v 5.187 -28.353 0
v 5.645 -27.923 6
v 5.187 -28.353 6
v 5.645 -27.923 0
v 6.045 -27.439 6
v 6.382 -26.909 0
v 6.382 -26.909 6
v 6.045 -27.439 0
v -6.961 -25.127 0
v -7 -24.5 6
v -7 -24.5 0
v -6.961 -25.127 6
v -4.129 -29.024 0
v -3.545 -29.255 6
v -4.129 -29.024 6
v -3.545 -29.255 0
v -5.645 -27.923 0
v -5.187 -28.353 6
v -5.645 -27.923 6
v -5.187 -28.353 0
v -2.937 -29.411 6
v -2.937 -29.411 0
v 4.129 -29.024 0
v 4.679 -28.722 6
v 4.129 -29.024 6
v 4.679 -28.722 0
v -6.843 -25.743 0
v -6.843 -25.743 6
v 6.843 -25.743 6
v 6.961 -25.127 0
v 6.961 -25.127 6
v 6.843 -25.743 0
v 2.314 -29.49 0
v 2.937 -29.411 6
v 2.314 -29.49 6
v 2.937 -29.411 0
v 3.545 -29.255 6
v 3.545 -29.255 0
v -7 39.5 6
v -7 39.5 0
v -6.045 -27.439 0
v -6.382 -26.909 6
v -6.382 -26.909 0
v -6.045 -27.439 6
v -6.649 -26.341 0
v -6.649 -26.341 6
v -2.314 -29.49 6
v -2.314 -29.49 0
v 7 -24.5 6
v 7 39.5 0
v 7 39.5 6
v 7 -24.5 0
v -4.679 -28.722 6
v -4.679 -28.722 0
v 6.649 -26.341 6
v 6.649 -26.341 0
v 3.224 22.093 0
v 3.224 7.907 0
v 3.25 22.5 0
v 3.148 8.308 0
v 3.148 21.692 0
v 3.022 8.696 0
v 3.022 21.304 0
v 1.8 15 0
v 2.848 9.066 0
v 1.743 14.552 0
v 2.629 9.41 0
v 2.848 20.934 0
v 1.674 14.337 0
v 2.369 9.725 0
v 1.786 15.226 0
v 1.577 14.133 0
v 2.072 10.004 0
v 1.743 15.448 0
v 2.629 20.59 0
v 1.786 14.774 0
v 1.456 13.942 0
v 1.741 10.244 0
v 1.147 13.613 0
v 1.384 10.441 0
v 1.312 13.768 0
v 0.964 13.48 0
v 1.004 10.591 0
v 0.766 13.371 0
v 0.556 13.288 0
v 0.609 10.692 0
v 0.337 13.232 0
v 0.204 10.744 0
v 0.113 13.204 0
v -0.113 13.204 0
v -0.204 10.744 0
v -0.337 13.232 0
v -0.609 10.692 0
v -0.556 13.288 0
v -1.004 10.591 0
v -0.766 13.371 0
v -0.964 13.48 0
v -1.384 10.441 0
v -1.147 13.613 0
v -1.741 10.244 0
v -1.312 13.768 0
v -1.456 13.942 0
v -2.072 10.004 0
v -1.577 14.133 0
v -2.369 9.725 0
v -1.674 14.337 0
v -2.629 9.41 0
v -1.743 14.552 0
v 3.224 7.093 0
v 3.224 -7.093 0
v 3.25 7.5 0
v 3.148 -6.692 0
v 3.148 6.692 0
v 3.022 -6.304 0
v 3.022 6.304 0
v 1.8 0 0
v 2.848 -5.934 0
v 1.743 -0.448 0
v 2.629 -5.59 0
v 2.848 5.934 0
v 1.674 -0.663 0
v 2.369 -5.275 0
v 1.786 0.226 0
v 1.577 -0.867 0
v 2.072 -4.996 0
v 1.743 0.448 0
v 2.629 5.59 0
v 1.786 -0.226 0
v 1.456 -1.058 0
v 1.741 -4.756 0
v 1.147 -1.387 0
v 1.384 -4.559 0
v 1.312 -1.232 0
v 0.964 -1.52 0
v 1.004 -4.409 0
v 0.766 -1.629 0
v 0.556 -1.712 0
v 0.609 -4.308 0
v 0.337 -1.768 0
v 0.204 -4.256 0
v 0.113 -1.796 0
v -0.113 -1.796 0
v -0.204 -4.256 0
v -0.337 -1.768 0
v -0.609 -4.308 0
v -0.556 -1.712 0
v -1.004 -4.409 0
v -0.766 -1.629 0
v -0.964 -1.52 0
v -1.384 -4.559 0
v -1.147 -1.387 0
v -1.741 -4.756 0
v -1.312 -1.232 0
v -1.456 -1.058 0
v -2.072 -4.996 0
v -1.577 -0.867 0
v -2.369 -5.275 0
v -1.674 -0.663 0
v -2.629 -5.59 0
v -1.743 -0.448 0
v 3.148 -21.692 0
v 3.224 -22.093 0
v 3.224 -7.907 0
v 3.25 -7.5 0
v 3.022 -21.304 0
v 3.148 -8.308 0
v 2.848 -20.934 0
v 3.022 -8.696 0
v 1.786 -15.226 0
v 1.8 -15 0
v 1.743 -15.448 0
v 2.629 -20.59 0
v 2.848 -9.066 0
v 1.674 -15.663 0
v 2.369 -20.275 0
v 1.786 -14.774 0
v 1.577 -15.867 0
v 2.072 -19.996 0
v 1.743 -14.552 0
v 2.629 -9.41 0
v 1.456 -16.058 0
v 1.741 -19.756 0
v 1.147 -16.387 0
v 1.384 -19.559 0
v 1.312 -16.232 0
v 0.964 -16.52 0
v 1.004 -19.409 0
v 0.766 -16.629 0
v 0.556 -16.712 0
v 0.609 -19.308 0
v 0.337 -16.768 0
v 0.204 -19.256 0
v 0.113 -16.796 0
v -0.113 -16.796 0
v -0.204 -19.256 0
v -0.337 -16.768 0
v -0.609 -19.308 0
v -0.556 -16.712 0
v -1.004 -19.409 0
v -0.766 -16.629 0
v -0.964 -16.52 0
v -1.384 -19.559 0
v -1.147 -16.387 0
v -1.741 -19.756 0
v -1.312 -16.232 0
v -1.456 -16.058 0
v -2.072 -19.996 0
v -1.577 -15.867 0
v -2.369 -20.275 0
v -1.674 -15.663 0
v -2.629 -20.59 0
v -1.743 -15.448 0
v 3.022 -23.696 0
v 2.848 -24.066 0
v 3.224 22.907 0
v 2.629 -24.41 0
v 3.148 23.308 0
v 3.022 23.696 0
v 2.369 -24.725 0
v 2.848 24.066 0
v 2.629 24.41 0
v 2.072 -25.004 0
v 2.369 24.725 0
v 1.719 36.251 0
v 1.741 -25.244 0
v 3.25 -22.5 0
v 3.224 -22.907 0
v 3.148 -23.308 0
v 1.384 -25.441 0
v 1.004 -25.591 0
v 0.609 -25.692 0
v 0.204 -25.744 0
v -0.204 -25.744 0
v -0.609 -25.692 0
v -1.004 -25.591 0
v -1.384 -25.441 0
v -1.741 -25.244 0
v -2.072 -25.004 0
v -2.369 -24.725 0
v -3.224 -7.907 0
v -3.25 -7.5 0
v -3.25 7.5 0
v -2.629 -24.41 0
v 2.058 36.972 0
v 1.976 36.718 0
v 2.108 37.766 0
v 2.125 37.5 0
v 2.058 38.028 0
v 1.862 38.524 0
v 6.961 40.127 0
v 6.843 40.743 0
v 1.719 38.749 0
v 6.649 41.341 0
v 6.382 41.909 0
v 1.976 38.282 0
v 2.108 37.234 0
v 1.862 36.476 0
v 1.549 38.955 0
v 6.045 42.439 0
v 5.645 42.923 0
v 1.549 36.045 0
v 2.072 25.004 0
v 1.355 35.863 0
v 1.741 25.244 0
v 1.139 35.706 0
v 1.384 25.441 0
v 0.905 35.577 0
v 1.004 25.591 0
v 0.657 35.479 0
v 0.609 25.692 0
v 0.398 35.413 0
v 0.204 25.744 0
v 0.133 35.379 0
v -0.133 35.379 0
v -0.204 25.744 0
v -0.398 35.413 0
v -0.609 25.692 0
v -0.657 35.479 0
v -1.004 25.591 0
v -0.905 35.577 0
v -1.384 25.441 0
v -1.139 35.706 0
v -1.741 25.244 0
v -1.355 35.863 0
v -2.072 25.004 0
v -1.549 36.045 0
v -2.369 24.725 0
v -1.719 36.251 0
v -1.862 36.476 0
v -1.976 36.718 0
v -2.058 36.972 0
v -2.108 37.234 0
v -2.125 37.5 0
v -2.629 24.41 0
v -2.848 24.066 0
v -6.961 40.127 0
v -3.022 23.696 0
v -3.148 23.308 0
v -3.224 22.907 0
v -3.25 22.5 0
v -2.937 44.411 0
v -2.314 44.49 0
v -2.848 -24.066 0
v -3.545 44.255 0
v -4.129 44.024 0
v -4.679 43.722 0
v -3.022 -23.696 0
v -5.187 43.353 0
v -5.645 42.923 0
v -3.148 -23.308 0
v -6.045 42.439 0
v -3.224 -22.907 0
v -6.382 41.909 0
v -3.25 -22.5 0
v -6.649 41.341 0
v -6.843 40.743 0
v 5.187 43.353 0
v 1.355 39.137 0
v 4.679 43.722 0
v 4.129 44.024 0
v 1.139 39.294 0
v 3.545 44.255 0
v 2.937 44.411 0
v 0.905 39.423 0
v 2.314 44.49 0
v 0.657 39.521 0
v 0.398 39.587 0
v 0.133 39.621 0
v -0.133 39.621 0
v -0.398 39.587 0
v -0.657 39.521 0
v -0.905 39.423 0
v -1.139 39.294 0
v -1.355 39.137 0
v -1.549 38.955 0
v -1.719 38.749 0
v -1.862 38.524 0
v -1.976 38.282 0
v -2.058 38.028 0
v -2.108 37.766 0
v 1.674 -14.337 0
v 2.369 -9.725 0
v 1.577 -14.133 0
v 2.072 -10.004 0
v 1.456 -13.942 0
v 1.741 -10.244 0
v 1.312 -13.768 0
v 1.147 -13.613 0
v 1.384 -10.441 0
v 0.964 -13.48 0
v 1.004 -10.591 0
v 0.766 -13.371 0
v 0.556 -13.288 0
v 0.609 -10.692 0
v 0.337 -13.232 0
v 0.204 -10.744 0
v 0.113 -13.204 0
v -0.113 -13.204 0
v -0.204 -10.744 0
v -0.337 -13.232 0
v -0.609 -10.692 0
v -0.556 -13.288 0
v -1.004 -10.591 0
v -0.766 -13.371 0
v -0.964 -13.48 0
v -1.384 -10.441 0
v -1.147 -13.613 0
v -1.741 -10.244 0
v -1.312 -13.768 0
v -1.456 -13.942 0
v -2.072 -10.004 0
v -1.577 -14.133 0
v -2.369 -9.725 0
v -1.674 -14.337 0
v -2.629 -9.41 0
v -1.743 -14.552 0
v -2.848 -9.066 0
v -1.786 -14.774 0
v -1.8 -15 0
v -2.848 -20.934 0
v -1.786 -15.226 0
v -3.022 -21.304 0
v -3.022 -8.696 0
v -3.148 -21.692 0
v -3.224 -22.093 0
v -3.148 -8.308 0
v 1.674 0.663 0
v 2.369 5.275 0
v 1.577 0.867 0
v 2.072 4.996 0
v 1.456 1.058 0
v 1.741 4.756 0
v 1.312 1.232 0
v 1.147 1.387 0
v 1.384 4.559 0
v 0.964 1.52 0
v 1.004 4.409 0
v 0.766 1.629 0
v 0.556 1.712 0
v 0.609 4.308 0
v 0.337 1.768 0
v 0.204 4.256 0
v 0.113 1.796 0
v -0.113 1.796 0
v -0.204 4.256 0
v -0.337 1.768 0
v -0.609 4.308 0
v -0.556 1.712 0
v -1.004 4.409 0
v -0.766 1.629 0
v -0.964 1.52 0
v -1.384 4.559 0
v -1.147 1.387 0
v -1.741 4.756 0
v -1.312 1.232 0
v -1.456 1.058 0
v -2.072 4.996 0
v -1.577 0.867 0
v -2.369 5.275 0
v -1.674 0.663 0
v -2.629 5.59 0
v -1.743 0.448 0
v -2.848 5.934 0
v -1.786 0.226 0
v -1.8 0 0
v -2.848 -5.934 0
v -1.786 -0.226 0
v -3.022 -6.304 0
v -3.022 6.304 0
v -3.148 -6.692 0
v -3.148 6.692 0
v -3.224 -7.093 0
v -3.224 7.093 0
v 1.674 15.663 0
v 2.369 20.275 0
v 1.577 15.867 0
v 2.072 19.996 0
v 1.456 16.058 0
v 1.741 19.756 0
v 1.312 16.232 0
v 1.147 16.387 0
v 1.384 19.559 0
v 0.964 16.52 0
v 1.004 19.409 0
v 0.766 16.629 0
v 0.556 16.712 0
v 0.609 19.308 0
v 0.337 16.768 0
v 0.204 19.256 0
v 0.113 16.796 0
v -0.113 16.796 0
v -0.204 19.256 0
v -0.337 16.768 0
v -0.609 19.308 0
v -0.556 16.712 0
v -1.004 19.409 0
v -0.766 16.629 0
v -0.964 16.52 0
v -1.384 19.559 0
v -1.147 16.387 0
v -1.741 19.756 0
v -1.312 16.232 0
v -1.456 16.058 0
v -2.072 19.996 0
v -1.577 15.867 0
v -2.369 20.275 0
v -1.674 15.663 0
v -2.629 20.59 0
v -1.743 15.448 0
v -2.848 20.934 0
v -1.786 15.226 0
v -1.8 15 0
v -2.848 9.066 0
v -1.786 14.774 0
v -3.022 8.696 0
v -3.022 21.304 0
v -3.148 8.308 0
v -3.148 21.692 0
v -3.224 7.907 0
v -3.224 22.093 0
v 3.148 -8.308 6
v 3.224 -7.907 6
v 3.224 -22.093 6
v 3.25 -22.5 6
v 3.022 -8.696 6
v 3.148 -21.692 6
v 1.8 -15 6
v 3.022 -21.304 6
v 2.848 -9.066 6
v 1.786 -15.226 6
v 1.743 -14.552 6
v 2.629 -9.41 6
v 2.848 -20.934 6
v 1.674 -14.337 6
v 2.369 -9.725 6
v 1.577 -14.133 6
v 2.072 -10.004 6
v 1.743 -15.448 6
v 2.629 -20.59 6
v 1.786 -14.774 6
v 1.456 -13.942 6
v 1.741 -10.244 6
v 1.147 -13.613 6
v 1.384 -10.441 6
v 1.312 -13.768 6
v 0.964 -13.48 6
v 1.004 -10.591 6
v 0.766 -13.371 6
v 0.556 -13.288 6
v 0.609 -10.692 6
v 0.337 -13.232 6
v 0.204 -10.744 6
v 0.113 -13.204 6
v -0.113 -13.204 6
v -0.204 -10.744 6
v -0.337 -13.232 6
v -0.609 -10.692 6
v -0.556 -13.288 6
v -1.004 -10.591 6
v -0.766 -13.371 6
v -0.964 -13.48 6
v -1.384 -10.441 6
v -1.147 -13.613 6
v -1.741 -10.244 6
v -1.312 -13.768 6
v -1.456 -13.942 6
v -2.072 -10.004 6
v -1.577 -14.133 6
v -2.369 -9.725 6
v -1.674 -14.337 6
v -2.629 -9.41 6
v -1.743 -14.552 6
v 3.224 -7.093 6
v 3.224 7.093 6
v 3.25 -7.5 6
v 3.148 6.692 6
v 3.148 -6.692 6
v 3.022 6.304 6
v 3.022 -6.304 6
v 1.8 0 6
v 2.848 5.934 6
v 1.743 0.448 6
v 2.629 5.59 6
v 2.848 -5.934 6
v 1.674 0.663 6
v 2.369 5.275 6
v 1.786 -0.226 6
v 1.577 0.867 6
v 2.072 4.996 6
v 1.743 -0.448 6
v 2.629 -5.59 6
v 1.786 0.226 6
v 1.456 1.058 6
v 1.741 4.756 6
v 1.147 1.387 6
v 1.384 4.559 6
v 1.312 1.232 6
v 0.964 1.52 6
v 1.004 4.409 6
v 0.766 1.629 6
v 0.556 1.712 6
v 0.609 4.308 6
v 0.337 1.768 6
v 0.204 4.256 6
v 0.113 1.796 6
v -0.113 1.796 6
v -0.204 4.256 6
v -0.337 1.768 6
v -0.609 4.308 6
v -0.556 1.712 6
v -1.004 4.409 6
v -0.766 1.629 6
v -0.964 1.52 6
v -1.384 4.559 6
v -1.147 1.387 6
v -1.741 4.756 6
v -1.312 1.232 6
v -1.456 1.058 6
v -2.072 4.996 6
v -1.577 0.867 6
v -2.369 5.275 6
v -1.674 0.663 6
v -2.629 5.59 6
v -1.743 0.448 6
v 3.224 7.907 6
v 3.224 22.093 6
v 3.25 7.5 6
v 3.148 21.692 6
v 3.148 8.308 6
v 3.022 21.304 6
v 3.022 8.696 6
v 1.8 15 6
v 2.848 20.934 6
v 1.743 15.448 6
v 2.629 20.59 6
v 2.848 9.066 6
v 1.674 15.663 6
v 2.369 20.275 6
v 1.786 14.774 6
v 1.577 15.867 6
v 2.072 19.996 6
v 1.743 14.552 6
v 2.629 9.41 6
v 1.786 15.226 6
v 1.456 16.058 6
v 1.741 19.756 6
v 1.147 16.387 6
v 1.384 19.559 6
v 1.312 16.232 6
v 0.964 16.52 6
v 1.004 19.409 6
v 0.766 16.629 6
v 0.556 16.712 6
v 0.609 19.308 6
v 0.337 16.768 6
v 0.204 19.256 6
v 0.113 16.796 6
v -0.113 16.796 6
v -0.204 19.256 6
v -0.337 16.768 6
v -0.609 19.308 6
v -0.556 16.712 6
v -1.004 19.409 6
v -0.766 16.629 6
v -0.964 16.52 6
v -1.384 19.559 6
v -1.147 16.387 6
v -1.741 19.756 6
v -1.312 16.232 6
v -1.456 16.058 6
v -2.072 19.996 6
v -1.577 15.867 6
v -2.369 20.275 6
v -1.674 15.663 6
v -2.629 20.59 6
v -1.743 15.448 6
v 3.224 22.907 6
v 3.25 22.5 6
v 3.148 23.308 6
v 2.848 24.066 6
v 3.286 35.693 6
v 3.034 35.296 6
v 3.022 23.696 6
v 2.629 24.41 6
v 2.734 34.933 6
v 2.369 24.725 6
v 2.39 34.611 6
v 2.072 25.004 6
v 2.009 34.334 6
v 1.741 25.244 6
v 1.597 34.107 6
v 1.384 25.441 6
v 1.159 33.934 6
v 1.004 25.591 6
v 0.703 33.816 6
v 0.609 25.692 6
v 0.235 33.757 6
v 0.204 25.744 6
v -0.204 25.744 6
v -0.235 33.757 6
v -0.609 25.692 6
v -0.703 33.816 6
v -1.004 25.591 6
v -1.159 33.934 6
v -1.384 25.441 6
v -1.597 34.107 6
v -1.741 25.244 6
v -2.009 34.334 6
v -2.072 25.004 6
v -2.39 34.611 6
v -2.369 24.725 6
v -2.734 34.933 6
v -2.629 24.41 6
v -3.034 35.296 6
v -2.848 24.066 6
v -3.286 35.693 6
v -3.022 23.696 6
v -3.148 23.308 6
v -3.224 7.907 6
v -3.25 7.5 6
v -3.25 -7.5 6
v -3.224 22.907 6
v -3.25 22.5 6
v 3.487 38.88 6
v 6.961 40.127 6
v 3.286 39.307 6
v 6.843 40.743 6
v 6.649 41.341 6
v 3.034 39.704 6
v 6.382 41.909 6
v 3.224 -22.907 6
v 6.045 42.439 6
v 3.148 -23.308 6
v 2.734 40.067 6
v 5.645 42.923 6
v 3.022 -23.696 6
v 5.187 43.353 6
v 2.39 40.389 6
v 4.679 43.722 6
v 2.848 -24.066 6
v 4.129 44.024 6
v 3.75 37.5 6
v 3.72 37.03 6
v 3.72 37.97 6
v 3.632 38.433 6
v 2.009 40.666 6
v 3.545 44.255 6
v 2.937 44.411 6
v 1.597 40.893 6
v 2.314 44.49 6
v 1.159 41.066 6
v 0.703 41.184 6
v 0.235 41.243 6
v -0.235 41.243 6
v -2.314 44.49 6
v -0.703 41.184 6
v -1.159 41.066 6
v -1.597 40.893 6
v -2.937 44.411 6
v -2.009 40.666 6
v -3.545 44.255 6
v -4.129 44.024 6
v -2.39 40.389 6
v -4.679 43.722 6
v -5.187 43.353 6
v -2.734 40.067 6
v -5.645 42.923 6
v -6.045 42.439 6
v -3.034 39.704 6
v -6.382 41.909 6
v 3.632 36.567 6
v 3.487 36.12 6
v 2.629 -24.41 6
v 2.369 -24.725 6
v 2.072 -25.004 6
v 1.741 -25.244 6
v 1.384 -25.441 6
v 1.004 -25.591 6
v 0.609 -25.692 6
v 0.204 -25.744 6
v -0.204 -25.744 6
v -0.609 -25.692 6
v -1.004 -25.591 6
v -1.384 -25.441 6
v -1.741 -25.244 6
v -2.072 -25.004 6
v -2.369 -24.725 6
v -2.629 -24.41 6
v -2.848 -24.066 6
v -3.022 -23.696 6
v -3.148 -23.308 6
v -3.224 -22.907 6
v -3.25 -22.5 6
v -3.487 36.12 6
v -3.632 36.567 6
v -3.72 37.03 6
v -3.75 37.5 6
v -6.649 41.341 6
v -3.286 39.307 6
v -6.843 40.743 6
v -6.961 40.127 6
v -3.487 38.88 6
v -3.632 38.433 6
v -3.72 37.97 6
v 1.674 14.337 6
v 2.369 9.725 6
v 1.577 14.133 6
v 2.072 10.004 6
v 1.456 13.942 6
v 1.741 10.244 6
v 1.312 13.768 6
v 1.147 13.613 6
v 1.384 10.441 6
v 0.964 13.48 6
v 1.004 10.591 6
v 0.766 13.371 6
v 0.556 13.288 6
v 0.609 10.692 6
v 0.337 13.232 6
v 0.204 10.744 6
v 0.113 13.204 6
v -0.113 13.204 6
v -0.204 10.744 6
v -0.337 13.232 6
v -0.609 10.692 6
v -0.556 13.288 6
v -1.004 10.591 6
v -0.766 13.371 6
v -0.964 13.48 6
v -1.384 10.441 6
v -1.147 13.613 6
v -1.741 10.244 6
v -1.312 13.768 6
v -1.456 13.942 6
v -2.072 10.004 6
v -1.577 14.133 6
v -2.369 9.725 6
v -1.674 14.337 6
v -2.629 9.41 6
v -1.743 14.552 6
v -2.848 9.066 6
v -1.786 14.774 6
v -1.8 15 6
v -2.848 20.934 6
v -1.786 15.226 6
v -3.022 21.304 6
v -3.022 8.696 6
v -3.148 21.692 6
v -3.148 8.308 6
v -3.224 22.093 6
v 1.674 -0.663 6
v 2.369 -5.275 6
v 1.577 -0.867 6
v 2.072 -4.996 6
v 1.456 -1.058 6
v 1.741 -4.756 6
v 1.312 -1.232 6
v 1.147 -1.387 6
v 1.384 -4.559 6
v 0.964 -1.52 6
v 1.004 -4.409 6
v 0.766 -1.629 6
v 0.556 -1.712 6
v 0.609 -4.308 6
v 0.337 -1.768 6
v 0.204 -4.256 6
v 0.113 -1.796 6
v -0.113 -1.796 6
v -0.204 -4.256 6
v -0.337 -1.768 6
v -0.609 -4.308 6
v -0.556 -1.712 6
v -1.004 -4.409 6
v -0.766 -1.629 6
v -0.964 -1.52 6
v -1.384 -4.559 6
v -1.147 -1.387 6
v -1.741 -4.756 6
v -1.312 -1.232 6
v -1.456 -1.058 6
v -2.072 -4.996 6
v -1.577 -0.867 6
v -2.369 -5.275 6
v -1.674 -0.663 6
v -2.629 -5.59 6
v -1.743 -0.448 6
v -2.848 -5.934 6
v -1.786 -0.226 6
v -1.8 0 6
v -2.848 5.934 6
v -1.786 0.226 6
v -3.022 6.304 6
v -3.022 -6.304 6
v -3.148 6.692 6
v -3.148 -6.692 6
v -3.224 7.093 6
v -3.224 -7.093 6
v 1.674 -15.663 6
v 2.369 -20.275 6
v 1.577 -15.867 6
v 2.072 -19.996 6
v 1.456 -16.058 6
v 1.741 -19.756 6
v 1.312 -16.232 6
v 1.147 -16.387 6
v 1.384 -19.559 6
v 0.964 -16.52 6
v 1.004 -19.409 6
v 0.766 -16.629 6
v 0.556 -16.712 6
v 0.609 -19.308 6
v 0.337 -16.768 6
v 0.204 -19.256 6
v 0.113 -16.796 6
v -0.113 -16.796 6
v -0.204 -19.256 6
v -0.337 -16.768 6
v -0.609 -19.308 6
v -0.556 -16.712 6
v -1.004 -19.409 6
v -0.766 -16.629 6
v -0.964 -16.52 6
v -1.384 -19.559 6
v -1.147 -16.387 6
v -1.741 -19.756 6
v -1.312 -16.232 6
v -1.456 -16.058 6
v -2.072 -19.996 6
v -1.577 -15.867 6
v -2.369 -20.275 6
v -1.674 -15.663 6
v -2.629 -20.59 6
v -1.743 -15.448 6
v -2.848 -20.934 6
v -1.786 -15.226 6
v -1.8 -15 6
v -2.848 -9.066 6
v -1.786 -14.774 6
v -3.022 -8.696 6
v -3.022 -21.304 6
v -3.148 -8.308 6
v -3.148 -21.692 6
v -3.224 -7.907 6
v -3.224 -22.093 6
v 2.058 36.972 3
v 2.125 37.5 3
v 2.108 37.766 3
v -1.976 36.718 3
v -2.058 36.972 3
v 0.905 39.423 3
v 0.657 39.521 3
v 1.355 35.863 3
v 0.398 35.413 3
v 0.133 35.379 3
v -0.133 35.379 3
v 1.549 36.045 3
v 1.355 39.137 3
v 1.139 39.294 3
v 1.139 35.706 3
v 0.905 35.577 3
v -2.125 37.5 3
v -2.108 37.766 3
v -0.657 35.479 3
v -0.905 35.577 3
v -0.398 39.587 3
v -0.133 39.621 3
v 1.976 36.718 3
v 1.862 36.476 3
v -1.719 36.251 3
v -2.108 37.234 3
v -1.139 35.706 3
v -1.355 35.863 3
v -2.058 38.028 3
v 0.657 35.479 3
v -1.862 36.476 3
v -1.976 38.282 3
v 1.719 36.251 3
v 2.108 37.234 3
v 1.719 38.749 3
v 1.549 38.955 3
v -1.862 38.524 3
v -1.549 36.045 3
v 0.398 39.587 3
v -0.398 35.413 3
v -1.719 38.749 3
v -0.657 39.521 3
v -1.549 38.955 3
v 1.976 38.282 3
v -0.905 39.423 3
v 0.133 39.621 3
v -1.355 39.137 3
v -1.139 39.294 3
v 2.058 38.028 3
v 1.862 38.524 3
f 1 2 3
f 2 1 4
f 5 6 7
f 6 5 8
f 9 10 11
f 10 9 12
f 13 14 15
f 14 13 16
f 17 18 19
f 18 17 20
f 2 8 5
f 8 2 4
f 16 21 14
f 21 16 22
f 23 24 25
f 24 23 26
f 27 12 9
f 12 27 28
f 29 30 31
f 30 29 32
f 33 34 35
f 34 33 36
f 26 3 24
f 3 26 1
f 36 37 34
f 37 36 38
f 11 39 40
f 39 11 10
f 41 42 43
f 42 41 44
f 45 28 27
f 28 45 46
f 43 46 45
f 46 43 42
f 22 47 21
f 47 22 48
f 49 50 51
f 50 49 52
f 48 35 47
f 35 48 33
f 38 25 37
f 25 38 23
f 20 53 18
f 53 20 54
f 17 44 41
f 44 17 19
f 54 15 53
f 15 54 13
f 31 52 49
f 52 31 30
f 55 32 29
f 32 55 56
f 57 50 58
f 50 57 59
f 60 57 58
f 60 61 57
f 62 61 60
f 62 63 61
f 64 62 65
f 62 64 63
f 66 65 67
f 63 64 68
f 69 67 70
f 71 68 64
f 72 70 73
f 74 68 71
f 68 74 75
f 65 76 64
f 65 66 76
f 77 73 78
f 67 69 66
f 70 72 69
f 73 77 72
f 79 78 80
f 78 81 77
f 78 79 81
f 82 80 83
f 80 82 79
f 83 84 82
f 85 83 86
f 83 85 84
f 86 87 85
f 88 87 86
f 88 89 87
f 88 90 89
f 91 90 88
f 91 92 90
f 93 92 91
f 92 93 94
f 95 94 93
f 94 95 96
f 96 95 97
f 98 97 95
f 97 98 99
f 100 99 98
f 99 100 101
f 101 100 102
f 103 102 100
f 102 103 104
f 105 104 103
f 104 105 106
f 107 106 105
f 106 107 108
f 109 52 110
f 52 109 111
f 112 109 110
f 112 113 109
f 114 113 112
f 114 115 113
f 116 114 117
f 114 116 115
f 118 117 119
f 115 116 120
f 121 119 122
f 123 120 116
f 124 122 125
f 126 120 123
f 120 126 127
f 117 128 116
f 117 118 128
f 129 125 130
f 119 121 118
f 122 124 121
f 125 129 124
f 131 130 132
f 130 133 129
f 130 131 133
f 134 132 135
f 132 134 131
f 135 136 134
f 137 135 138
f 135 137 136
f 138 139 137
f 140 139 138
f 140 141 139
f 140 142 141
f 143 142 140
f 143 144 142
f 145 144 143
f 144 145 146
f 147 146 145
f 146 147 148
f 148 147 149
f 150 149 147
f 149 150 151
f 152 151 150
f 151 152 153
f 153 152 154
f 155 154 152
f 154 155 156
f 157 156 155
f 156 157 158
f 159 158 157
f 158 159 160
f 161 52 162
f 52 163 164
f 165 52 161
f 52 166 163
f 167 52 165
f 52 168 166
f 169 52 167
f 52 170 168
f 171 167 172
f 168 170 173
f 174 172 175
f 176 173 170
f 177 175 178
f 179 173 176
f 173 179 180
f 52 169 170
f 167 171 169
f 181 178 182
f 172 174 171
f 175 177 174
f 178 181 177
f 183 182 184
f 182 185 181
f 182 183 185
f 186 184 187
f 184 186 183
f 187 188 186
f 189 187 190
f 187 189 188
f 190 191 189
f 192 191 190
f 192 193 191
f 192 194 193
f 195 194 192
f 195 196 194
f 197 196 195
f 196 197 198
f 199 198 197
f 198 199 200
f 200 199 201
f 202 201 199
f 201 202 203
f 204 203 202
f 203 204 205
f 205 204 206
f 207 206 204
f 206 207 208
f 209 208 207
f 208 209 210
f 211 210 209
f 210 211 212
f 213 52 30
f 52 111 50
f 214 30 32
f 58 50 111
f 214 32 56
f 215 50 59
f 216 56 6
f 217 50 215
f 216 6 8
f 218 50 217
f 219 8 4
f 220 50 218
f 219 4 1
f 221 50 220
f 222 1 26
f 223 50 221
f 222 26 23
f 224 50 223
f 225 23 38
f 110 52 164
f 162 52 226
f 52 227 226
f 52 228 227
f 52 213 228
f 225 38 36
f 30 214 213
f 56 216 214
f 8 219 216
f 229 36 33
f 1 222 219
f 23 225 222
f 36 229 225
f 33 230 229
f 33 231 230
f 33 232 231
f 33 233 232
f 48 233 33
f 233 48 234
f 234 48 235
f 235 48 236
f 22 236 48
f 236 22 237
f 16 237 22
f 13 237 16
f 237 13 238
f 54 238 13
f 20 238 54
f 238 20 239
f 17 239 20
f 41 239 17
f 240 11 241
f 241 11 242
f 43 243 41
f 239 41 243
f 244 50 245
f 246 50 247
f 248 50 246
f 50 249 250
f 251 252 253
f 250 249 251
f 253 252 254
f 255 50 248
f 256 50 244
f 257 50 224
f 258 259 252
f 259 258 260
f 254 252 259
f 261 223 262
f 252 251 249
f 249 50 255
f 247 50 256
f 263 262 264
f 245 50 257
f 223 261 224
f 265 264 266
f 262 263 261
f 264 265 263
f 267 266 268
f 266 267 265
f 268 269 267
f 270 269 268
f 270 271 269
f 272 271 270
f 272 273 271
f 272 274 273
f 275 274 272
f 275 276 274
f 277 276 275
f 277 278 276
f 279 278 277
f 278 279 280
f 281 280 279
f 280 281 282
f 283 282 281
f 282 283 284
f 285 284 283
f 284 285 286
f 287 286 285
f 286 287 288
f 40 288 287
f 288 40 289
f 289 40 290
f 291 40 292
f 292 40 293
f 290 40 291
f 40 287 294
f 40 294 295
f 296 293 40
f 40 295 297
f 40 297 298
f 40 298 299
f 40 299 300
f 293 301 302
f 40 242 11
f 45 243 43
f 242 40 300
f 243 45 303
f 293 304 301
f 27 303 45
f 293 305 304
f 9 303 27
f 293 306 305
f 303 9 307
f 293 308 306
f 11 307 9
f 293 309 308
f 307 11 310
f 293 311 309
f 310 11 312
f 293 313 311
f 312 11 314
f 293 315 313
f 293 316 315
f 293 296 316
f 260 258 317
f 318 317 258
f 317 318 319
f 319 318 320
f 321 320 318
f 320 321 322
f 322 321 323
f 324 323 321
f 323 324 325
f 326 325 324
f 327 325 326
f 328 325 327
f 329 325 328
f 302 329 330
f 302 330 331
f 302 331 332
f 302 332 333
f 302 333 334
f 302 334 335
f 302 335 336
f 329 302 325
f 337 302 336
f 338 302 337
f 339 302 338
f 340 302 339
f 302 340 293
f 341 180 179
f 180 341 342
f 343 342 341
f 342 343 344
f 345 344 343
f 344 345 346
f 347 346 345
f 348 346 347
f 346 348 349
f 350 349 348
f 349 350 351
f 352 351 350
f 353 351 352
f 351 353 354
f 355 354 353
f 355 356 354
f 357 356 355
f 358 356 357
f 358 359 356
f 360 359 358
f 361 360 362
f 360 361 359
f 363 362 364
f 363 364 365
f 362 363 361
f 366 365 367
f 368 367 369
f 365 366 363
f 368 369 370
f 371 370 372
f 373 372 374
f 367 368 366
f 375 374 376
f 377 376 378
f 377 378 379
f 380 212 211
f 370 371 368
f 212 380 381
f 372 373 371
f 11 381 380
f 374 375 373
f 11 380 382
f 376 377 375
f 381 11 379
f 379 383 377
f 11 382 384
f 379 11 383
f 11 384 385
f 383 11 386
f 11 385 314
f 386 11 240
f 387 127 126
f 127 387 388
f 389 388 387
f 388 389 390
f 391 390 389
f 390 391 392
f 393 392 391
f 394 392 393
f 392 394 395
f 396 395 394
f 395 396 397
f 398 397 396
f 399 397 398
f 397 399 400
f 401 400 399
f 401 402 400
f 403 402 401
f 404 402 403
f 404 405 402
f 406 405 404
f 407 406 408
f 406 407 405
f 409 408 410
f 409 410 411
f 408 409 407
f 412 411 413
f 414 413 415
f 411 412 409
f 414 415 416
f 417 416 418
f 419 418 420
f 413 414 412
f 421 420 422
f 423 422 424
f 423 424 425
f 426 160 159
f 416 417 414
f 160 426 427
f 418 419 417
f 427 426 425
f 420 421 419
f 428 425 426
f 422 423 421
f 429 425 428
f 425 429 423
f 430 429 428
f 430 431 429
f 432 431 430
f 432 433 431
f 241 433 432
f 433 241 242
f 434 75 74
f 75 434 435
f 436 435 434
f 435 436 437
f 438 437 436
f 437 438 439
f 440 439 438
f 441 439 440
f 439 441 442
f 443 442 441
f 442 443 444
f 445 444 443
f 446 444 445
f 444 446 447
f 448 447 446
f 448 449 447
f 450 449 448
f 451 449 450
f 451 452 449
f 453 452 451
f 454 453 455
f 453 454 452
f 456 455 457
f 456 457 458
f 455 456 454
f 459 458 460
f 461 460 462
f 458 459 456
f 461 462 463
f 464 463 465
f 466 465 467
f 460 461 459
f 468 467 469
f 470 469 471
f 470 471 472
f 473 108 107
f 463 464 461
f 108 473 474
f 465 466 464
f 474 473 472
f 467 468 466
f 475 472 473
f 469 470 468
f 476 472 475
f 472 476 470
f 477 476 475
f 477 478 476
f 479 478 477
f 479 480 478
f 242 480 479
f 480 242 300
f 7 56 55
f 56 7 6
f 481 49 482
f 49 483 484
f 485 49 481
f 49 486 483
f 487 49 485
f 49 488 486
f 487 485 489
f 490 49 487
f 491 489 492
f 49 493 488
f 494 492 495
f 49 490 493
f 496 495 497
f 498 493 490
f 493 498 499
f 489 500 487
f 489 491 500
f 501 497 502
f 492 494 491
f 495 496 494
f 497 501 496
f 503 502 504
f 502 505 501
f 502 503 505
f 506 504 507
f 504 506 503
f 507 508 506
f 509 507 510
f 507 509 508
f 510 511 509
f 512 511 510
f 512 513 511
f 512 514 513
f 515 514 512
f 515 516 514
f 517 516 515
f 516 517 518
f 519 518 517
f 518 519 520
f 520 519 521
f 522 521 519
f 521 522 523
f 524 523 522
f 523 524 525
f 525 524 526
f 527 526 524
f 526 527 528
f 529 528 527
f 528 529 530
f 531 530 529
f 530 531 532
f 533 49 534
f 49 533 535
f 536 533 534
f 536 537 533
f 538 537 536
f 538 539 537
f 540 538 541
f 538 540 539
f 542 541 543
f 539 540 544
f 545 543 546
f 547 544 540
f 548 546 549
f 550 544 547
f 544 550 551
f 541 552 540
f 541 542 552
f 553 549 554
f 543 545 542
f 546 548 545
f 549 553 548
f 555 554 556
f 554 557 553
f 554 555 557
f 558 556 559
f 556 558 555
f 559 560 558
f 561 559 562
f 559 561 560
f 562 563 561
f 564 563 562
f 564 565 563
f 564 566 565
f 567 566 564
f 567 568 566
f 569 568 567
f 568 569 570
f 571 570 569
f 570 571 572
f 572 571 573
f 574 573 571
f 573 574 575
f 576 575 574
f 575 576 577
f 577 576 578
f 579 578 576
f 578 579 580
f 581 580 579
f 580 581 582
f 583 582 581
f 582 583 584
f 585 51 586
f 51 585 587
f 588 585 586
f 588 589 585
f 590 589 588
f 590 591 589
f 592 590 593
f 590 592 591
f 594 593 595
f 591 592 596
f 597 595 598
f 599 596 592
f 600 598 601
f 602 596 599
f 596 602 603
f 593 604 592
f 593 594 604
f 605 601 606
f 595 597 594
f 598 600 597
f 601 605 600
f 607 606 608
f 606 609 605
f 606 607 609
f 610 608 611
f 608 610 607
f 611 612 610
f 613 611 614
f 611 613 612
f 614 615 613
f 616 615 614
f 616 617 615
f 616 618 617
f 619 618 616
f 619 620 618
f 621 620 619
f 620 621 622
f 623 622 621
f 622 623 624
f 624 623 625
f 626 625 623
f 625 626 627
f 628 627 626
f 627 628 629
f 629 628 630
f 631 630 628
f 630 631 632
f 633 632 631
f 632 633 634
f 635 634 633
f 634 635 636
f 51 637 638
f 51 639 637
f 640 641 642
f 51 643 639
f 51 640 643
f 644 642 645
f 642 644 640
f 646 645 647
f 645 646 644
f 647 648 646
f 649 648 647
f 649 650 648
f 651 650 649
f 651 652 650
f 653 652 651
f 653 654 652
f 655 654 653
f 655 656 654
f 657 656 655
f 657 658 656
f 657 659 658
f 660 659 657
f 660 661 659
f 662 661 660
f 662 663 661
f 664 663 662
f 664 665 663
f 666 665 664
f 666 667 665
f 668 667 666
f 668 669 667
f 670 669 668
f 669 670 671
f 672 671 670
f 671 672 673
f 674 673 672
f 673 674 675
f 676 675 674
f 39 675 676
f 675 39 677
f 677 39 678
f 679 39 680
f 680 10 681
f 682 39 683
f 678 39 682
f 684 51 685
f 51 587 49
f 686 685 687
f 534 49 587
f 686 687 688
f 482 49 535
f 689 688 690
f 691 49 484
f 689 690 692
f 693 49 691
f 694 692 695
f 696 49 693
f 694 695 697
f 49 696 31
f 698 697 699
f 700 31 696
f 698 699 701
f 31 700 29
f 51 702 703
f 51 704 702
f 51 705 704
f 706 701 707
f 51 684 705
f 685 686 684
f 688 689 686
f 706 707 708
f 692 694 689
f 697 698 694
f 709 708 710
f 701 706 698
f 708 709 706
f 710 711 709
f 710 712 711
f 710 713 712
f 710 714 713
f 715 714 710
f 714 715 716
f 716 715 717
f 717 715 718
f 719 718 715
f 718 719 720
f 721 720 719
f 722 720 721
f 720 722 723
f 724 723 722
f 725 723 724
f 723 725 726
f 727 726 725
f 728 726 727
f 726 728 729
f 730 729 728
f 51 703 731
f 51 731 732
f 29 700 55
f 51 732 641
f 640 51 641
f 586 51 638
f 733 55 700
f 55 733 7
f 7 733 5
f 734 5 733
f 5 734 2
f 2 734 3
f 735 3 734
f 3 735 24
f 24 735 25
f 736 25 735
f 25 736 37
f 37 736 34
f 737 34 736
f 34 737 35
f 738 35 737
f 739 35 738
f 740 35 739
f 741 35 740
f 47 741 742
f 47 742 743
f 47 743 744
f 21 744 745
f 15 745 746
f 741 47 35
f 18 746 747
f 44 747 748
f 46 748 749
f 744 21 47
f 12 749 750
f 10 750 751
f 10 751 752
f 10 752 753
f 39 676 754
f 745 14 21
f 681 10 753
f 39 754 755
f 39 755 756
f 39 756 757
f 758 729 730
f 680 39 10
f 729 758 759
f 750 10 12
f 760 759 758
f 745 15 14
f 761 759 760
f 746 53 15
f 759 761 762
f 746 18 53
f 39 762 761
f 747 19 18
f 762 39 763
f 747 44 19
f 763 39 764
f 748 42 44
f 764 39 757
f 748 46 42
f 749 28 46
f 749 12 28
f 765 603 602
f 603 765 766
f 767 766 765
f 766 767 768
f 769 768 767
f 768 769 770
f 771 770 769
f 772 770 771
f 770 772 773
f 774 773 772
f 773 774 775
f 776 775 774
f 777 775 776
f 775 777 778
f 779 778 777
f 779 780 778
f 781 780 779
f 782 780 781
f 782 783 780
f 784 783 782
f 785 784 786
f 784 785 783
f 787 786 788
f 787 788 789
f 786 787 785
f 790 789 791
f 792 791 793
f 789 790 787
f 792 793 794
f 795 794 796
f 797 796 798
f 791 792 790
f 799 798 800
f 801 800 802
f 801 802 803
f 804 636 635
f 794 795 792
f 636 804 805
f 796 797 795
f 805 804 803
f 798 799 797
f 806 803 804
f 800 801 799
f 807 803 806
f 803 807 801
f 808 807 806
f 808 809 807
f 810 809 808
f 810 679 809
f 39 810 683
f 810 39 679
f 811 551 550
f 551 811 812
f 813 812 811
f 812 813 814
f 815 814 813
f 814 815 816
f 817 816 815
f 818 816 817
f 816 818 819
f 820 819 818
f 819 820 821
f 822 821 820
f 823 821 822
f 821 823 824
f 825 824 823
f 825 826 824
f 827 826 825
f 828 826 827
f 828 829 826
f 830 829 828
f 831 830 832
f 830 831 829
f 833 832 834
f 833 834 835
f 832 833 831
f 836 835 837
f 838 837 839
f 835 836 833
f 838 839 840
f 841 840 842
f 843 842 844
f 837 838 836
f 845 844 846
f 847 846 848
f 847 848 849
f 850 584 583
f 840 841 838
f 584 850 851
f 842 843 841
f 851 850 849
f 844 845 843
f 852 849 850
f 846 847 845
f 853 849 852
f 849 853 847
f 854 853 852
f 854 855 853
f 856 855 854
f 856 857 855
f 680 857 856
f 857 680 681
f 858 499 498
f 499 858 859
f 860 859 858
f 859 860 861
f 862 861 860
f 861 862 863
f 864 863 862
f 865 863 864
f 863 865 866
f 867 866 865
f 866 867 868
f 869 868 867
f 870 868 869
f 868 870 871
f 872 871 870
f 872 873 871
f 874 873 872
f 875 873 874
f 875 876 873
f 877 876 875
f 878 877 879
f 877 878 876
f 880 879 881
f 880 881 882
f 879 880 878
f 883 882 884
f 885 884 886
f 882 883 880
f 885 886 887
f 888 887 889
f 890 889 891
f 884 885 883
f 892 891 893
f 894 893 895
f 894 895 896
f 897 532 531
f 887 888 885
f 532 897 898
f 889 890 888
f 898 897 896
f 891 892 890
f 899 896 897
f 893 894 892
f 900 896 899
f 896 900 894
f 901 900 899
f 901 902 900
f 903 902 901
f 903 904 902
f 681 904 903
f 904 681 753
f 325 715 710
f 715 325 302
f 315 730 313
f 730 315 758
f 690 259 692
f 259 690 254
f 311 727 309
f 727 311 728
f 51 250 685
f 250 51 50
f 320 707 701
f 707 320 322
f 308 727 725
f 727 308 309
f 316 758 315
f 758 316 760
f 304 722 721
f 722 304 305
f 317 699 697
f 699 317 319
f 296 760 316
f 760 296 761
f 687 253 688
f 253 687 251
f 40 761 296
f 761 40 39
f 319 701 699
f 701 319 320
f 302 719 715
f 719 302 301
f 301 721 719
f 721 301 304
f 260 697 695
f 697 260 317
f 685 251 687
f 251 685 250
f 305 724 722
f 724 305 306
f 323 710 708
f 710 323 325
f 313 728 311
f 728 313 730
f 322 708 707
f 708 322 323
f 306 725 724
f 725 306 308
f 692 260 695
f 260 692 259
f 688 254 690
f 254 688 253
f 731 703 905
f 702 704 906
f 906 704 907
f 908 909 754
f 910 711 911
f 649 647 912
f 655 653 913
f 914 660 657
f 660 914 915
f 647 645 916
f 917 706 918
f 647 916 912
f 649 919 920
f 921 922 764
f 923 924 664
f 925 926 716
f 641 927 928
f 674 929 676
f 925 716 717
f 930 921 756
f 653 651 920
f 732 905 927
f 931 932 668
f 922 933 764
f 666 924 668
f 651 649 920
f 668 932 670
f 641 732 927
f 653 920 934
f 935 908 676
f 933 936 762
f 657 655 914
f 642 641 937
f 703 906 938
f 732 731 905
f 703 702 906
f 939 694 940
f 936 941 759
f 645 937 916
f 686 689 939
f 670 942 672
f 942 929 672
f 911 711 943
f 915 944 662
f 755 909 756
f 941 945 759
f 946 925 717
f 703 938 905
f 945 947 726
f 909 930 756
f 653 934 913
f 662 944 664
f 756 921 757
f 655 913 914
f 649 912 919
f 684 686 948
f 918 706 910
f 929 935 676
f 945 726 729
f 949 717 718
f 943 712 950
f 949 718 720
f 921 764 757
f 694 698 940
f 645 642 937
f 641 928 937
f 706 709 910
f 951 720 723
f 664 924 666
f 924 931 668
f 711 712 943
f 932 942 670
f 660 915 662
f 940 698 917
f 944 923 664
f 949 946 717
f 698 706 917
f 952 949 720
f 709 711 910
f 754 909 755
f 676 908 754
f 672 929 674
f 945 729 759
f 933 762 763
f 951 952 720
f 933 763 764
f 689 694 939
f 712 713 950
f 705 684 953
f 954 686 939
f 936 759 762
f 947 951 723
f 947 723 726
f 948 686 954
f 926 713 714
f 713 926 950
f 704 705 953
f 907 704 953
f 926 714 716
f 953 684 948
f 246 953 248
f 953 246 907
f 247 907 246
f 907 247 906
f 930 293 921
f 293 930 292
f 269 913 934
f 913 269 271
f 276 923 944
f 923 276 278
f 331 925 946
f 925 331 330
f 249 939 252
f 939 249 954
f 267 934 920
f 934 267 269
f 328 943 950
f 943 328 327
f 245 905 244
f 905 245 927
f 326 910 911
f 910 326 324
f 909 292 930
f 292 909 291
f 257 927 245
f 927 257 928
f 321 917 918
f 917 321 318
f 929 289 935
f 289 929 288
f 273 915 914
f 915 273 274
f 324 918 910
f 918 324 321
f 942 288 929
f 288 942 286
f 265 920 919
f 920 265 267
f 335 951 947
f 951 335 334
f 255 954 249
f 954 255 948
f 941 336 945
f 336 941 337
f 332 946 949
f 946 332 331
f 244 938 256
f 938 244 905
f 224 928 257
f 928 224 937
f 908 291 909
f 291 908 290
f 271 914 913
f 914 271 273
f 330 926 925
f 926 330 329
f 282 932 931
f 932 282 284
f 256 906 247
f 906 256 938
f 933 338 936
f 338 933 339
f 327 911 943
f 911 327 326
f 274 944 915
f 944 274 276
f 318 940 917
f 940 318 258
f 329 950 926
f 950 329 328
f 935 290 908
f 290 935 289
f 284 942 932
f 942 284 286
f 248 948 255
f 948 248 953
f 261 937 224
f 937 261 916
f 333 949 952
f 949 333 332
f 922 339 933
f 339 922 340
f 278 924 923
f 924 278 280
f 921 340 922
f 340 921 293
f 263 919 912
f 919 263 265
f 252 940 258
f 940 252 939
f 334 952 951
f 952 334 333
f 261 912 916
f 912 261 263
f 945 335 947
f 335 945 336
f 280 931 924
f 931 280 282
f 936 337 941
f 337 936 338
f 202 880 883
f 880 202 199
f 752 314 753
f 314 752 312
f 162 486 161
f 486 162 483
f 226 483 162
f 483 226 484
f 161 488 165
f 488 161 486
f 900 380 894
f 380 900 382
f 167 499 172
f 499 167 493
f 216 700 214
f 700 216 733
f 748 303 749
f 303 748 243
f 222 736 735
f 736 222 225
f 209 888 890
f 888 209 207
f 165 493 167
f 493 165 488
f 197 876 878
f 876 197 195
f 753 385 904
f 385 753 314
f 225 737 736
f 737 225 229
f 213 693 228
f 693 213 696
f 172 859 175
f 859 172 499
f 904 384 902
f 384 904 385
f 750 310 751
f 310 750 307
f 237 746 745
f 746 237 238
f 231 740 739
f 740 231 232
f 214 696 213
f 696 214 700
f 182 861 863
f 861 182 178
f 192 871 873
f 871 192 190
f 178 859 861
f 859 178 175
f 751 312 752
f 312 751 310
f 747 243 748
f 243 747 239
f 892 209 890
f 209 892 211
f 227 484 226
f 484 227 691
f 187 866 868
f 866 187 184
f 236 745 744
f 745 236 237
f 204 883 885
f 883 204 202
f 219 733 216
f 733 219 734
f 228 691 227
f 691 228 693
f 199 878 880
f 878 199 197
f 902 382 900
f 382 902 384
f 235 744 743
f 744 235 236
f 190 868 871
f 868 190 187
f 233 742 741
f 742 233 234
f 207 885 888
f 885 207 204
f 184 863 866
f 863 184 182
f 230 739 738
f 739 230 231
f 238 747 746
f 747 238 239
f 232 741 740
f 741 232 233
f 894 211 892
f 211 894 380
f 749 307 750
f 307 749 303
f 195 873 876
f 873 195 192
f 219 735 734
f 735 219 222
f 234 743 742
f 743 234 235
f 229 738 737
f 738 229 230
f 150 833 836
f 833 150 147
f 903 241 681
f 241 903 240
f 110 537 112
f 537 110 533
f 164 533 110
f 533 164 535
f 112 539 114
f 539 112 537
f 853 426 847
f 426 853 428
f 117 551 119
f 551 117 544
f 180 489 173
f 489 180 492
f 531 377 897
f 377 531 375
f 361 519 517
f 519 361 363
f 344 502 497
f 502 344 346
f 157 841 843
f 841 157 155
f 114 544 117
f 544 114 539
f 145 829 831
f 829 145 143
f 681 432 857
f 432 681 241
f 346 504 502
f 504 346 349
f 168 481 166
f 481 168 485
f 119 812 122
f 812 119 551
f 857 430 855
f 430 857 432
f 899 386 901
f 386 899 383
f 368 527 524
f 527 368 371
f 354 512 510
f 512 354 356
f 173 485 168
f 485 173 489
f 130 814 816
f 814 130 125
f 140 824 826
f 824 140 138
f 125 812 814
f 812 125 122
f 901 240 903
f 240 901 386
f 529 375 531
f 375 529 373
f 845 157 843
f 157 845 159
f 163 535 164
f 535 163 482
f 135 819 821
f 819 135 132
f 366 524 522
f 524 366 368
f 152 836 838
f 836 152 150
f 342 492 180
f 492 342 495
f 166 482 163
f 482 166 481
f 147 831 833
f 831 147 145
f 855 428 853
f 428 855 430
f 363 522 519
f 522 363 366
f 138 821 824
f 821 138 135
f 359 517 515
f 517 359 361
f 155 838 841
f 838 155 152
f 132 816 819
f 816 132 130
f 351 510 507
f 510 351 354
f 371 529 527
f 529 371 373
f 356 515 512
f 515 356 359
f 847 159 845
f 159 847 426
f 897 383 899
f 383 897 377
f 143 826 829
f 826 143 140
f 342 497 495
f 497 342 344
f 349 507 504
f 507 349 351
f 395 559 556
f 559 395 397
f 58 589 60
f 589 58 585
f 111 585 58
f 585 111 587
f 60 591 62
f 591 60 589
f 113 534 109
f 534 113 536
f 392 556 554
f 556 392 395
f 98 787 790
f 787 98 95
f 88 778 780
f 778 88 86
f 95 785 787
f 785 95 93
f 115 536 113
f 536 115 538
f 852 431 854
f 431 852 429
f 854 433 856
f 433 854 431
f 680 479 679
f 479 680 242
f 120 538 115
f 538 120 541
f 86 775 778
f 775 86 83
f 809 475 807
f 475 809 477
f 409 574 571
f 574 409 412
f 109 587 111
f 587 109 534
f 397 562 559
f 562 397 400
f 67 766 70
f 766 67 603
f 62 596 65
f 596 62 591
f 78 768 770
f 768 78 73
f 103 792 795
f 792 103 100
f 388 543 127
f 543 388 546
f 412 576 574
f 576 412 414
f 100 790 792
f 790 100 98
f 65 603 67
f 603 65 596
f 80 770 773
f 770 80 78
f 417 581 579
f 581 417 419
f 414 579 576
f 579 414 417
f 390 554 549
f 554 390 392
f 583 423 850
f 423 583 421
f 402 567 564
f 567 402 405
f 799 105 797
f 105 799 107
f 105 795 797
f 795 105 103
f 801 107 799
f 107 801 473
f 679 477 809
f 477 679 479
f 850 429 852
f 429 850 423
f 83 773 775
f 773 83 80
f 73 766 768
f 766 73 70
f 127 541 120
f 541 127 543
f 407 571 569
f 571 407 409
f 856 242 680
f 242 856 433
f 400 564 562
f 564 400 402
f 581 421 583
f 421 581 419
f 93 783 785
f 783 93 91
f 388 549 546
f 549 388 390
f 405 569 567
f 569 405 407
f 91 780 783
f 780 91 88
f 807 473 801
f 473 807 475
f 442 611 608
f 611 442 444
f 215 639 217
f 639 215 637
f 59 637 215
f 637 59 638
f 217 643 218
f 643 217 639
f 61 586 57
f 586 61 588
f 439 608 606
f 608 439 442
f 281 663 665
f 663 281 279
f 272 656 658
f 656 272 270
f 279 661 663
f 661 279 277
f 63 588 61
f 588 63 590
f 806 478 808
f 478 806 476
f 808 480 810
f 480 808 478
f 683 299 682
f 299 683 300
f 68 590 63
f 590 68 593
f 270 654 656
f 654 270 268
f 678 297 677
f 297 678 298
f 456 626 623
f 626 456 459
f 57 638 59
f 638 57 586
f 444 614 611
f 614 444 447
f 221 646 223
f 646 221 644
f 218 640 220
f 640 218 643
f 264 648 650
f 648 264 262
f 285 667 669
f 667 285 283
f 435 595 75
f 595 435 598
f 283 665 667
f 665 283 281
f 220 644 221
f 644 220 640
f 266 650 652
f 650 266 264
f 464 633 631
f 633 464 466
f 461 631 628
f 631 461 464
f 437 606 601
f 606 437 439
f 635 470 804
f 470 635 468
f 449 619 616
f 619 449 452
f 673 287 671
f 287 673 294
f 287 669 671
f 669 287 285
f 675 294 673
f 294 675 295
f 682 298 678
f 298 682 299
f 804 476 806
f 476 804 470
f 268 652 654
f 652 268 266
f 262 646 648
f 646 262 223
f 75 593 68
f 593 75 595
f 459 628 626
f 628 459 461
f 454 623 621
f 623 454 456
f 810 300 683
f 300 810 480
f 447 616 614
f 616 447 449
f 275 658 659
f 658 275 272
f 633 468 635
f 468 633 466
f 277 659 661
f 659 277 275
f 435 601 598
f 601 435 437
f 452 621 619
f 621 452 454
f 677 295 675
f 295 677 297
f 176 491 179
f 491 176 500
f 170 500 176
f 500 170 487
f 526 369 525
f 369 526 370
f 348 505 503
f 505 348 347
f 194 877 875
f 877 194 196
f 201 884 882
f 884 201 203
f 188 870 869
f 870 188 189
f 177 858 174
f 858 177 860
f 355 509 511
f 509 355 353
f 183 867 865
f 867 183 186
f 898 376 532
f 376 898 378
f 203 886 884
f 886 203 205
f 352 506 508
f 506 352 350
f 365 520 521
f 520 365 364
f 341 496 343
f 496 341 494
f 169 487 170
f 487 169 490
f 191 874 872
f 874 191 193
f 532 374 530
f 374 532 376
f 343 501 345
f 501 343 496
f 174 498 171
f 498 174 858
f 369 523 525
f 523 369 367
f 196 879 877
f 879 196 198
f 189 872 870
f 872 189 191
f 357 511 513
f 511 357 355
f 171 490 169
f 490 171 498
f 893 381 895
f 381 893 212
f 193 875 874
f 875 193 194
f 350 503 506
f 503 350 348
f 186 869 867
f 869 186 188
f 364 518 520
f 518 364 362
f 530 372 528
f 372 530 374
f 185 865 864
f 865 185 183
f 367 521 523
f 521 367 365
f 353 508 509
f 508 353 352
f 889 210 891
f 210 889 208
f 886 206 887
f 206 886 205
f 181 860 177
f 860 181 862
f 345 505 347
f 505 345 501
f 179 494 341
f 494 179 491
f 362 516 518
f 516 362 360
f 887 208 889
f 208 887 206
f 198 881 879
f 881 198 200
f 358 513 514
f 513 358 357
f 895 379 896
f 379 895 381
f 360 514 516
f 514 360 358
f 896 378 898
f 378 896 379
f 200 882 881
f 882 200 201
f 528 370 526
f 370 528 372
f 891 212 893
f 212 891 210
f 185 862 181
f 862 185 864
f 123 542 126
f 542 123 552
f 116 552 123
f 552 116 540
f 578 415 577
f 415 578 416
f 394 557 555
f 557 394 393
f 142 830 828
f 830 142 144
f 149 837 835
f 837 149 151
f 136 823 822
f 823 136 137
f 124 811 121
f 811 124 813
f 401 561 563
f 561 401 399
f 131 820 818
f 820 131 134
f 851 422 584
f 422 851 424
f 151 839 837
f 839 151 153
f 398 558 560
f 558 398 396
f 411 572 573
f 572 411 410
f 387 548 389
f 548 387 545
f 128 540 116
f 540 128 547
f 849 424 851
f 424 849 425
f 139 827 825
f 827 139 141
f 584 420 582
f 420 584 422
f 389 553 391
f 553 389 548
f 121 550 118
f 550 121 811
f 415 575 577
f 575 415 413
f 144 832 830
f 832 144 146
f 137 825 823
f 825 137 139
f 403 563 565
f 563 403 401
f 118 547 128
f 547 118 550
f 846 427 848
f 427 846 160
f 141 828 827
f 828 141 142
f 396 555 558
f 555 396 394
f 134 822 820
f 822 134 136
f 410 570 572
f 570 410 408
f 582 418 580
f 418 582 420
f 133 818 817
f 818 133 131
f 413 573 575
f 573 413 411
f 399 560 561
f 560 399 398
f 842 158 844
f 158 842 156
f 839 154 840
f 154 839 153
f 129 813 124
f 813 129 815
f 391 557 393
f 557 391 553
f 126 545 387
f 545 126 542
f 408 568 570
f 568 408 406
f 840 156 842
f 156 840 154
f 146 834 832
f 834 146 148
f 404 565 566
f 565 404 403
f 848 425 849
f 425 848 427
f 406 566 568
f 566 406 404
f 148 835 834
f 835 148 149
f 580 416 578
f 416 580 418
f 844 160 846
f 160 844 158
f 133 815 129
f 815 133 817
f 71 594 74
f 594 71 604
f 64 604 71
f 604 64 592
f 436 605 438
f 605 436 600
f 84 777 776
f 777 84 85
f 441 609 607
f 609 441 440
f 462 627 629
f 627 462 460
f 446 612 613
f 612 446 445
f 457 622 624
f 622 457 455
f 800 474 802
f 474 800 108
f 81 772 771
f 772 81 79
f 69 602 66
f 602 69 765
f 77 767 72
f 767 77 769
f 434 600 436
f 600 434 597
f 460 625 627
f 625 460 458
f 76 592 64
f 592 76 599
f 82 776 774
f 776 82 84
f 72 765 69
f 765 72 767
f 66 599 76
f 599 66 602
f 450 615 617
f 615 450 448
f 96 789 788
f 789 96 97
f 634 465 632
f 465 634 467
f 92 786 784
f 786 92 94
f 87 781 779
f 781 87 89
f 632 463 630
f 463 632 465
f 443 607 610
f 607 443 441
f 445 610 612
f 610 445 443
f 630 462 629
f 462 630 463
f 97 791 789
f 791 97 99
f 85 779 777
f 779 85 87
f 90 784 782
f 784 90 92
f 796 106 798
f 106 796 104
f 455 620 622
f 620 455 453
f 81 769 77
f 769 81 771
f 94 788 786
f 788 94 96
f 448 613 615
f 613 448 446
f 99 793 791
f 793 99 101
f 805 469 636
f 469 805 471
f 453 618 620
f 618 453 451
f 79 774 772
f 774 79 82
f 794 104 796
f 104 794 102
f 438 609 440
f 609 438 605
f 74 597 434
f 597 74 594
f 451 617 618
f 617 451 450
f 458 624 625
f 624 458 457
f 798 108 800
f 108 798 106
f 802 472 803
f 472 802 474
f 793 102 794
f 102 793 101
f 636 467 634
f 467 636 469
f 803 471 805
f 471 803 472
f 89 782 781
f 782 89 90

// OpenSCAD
$fn = 50;


difference() {
	union() {
		hull() {
			translate(v = [-2.0000000000, 24.5000000000, 0]) {
				cylinder(h = 6, r = 5);
			}
			translate(v = [2.0000000000, 24.5000000000, 0]) {
				cylinder(h = 6, r = 5);
			}
			translate(v = [-2.0000000000, -24.5000000000, 0]) {
				cylinder(h = 6, r = 5);
			}
			translate(v = [2.0000000000, -24.5000000000, 0]) {
				cylinder(h = 6, r = 5);
			}
		}
		translate(v = [0.0000000000, 30.0000000000, 0]) {
			hull() {
				translate(v = [-2.0000000000, 9.5000000000, 0]) {
					cylinder(h = 6, r = 5);
				}
				translate(v = [2.0000000000, 9.5000000000, 0]) {
					cylinder(h = 6, r = 5);
				}
				translate(v = [-2.0000000000, -9.5000000000, 0]) {
					cylinder(h = 6, r = 5);
				}
				translate(v = [2.0000000000, -9.5000000000, 0]) {
					cylinder(h = 6, r = 5);
				}
			}
		}
		translate(v = [0.0000000000, 30.0000000000, 0]) {
			hull() {
				translate(v = [-2.0000000000, 9.5000000000, 0]) {
					cylinder(h = 6, r = 5);
				}
				translate(v = [2.0000000000, 9.5000000000, 0]) {
					cylinder(h = 6, r = 5);
				}
				translate(v = [-2.0000000000, -9.5000000000, 0]) {
					cylinder(h = 6, r = 5);
				}
				translate(v = [2.0000000000, -9.5000000000, 0]) {
					cylinder(h = 6, r = 5);
				}
			}
		}
	}
	union() {
		translate(v = [0.0000000000, 37.5000000000, 6]) {
			rotate(a = [0, 0, 0]) {
				difference() {
					union() {
						#translate(v = [0, 0, -6.0000000000]) {
							cylinder(h = 6, r = 2.0000000000);
						}
						#translate(v = [0, 0, -3]) {
							cylinder(h = 3, r1 = 2.1250000000, r2 = 3.7500000000);
						}
						#translate(v = [0, 0, -6.0000000000]) {
							cylinder(h = 6, r = 2.1250000000);
						}
						#translate(v = [0, 0, -6.0000000000]) {
							cylinder(h = 6, r = 2.0000000000);
						}
					}
					union();
				}
			}
		}
		translate(v = [0.0000000000, 37.5000000000, 6]) {
			rotate(a = [0, 0, 0]) {
				difference() {
					union() {
						#translate(v = [0, 0, -6.0000000000]) {
							cylinder(h = 6, r = 2.0000000000);
						}
						#translate(v = [0, 0, -3]) {
							cylinder(h = 3, r1 = 2.1250000000, r2 = 3.7500000000);
						}
						#translate(v = [0, 0, -6.0000000000]) {
							cylinder(h = 6, r = 2.1250000000);
						}
						#translate(v = [0, 0, -6.0000000000]) {
							cylinder(h = 6, r = 2.0000000000);
						}
					}
					union();
				}
			}
		}
		translate(v = [0.0000000000, -22.5000000000, 0]) {
			translate(v = [0, 0, -100]) {
				cylinder(h = 200, r = 3.2500000000);
			}
		}
		translate(v = [0.0000000000, -7.5000000000, 0]) {
			translate(v = [0, 0, -100]) {
				cylinder(h = 200, r = 3.2500000000);
			}
		}
		translate(v = [0.0000000000, 7.5000000000, 0]) {
			translate(v = [0, 0, -100]) {
				cylinder(h = 200, r = 3.2500000000);
			}
		}
		translate(v = [0.0000000000, 22.5000000000, 0]) {
			translate(v = [0, 0, -100]) {
				cylinder(h = 200, r = 3.2500000000);
			}
		}
		translate(v = [0.0000000000, -22.5000000000, 0]) {
			translate(v = [0, 0, -100]) {
				cylinder(h = 200, r = 1.8000000000);
			}
		}
		translate(v = [0.0000000000, -15.0000000000, 0]) {
			translate(v = [0, 0, -100]) {
				cylinder(h = 200, r = 1.8000000000);
			}
		}
		translate(v = [0.0000000000, -7.5000000000, 0]) {
			translate(v = [0, 0, -100]) {
				cylinder(h = 200, r = 1.8000000000);
			}
		}
		translate(v = [0, 0, -100]) {
			cylinder(h = 200, r = 1.8000000000);
		}
		translate(v = [0.0000000000, 7.5000000000, 0]) {
			translate(v = [0, 0, -100]) {
				cylinder(h = 200, r = 1.8000000000);
			}
		}
		translate(v = [0.0000000000, 15.0000000000, 0]) {
			translate(v = [0, 0, -100]) {
				cylinder(h = 200, r = 1.8000000000);
			}
		}
		translate(v = [0.0000000000, 22.5000000000, 0]) {
			translate(v = [0, 0, -100]) {
				cylinder(h = 200, r = 1.8000000000);
			}
		}
	}
}
